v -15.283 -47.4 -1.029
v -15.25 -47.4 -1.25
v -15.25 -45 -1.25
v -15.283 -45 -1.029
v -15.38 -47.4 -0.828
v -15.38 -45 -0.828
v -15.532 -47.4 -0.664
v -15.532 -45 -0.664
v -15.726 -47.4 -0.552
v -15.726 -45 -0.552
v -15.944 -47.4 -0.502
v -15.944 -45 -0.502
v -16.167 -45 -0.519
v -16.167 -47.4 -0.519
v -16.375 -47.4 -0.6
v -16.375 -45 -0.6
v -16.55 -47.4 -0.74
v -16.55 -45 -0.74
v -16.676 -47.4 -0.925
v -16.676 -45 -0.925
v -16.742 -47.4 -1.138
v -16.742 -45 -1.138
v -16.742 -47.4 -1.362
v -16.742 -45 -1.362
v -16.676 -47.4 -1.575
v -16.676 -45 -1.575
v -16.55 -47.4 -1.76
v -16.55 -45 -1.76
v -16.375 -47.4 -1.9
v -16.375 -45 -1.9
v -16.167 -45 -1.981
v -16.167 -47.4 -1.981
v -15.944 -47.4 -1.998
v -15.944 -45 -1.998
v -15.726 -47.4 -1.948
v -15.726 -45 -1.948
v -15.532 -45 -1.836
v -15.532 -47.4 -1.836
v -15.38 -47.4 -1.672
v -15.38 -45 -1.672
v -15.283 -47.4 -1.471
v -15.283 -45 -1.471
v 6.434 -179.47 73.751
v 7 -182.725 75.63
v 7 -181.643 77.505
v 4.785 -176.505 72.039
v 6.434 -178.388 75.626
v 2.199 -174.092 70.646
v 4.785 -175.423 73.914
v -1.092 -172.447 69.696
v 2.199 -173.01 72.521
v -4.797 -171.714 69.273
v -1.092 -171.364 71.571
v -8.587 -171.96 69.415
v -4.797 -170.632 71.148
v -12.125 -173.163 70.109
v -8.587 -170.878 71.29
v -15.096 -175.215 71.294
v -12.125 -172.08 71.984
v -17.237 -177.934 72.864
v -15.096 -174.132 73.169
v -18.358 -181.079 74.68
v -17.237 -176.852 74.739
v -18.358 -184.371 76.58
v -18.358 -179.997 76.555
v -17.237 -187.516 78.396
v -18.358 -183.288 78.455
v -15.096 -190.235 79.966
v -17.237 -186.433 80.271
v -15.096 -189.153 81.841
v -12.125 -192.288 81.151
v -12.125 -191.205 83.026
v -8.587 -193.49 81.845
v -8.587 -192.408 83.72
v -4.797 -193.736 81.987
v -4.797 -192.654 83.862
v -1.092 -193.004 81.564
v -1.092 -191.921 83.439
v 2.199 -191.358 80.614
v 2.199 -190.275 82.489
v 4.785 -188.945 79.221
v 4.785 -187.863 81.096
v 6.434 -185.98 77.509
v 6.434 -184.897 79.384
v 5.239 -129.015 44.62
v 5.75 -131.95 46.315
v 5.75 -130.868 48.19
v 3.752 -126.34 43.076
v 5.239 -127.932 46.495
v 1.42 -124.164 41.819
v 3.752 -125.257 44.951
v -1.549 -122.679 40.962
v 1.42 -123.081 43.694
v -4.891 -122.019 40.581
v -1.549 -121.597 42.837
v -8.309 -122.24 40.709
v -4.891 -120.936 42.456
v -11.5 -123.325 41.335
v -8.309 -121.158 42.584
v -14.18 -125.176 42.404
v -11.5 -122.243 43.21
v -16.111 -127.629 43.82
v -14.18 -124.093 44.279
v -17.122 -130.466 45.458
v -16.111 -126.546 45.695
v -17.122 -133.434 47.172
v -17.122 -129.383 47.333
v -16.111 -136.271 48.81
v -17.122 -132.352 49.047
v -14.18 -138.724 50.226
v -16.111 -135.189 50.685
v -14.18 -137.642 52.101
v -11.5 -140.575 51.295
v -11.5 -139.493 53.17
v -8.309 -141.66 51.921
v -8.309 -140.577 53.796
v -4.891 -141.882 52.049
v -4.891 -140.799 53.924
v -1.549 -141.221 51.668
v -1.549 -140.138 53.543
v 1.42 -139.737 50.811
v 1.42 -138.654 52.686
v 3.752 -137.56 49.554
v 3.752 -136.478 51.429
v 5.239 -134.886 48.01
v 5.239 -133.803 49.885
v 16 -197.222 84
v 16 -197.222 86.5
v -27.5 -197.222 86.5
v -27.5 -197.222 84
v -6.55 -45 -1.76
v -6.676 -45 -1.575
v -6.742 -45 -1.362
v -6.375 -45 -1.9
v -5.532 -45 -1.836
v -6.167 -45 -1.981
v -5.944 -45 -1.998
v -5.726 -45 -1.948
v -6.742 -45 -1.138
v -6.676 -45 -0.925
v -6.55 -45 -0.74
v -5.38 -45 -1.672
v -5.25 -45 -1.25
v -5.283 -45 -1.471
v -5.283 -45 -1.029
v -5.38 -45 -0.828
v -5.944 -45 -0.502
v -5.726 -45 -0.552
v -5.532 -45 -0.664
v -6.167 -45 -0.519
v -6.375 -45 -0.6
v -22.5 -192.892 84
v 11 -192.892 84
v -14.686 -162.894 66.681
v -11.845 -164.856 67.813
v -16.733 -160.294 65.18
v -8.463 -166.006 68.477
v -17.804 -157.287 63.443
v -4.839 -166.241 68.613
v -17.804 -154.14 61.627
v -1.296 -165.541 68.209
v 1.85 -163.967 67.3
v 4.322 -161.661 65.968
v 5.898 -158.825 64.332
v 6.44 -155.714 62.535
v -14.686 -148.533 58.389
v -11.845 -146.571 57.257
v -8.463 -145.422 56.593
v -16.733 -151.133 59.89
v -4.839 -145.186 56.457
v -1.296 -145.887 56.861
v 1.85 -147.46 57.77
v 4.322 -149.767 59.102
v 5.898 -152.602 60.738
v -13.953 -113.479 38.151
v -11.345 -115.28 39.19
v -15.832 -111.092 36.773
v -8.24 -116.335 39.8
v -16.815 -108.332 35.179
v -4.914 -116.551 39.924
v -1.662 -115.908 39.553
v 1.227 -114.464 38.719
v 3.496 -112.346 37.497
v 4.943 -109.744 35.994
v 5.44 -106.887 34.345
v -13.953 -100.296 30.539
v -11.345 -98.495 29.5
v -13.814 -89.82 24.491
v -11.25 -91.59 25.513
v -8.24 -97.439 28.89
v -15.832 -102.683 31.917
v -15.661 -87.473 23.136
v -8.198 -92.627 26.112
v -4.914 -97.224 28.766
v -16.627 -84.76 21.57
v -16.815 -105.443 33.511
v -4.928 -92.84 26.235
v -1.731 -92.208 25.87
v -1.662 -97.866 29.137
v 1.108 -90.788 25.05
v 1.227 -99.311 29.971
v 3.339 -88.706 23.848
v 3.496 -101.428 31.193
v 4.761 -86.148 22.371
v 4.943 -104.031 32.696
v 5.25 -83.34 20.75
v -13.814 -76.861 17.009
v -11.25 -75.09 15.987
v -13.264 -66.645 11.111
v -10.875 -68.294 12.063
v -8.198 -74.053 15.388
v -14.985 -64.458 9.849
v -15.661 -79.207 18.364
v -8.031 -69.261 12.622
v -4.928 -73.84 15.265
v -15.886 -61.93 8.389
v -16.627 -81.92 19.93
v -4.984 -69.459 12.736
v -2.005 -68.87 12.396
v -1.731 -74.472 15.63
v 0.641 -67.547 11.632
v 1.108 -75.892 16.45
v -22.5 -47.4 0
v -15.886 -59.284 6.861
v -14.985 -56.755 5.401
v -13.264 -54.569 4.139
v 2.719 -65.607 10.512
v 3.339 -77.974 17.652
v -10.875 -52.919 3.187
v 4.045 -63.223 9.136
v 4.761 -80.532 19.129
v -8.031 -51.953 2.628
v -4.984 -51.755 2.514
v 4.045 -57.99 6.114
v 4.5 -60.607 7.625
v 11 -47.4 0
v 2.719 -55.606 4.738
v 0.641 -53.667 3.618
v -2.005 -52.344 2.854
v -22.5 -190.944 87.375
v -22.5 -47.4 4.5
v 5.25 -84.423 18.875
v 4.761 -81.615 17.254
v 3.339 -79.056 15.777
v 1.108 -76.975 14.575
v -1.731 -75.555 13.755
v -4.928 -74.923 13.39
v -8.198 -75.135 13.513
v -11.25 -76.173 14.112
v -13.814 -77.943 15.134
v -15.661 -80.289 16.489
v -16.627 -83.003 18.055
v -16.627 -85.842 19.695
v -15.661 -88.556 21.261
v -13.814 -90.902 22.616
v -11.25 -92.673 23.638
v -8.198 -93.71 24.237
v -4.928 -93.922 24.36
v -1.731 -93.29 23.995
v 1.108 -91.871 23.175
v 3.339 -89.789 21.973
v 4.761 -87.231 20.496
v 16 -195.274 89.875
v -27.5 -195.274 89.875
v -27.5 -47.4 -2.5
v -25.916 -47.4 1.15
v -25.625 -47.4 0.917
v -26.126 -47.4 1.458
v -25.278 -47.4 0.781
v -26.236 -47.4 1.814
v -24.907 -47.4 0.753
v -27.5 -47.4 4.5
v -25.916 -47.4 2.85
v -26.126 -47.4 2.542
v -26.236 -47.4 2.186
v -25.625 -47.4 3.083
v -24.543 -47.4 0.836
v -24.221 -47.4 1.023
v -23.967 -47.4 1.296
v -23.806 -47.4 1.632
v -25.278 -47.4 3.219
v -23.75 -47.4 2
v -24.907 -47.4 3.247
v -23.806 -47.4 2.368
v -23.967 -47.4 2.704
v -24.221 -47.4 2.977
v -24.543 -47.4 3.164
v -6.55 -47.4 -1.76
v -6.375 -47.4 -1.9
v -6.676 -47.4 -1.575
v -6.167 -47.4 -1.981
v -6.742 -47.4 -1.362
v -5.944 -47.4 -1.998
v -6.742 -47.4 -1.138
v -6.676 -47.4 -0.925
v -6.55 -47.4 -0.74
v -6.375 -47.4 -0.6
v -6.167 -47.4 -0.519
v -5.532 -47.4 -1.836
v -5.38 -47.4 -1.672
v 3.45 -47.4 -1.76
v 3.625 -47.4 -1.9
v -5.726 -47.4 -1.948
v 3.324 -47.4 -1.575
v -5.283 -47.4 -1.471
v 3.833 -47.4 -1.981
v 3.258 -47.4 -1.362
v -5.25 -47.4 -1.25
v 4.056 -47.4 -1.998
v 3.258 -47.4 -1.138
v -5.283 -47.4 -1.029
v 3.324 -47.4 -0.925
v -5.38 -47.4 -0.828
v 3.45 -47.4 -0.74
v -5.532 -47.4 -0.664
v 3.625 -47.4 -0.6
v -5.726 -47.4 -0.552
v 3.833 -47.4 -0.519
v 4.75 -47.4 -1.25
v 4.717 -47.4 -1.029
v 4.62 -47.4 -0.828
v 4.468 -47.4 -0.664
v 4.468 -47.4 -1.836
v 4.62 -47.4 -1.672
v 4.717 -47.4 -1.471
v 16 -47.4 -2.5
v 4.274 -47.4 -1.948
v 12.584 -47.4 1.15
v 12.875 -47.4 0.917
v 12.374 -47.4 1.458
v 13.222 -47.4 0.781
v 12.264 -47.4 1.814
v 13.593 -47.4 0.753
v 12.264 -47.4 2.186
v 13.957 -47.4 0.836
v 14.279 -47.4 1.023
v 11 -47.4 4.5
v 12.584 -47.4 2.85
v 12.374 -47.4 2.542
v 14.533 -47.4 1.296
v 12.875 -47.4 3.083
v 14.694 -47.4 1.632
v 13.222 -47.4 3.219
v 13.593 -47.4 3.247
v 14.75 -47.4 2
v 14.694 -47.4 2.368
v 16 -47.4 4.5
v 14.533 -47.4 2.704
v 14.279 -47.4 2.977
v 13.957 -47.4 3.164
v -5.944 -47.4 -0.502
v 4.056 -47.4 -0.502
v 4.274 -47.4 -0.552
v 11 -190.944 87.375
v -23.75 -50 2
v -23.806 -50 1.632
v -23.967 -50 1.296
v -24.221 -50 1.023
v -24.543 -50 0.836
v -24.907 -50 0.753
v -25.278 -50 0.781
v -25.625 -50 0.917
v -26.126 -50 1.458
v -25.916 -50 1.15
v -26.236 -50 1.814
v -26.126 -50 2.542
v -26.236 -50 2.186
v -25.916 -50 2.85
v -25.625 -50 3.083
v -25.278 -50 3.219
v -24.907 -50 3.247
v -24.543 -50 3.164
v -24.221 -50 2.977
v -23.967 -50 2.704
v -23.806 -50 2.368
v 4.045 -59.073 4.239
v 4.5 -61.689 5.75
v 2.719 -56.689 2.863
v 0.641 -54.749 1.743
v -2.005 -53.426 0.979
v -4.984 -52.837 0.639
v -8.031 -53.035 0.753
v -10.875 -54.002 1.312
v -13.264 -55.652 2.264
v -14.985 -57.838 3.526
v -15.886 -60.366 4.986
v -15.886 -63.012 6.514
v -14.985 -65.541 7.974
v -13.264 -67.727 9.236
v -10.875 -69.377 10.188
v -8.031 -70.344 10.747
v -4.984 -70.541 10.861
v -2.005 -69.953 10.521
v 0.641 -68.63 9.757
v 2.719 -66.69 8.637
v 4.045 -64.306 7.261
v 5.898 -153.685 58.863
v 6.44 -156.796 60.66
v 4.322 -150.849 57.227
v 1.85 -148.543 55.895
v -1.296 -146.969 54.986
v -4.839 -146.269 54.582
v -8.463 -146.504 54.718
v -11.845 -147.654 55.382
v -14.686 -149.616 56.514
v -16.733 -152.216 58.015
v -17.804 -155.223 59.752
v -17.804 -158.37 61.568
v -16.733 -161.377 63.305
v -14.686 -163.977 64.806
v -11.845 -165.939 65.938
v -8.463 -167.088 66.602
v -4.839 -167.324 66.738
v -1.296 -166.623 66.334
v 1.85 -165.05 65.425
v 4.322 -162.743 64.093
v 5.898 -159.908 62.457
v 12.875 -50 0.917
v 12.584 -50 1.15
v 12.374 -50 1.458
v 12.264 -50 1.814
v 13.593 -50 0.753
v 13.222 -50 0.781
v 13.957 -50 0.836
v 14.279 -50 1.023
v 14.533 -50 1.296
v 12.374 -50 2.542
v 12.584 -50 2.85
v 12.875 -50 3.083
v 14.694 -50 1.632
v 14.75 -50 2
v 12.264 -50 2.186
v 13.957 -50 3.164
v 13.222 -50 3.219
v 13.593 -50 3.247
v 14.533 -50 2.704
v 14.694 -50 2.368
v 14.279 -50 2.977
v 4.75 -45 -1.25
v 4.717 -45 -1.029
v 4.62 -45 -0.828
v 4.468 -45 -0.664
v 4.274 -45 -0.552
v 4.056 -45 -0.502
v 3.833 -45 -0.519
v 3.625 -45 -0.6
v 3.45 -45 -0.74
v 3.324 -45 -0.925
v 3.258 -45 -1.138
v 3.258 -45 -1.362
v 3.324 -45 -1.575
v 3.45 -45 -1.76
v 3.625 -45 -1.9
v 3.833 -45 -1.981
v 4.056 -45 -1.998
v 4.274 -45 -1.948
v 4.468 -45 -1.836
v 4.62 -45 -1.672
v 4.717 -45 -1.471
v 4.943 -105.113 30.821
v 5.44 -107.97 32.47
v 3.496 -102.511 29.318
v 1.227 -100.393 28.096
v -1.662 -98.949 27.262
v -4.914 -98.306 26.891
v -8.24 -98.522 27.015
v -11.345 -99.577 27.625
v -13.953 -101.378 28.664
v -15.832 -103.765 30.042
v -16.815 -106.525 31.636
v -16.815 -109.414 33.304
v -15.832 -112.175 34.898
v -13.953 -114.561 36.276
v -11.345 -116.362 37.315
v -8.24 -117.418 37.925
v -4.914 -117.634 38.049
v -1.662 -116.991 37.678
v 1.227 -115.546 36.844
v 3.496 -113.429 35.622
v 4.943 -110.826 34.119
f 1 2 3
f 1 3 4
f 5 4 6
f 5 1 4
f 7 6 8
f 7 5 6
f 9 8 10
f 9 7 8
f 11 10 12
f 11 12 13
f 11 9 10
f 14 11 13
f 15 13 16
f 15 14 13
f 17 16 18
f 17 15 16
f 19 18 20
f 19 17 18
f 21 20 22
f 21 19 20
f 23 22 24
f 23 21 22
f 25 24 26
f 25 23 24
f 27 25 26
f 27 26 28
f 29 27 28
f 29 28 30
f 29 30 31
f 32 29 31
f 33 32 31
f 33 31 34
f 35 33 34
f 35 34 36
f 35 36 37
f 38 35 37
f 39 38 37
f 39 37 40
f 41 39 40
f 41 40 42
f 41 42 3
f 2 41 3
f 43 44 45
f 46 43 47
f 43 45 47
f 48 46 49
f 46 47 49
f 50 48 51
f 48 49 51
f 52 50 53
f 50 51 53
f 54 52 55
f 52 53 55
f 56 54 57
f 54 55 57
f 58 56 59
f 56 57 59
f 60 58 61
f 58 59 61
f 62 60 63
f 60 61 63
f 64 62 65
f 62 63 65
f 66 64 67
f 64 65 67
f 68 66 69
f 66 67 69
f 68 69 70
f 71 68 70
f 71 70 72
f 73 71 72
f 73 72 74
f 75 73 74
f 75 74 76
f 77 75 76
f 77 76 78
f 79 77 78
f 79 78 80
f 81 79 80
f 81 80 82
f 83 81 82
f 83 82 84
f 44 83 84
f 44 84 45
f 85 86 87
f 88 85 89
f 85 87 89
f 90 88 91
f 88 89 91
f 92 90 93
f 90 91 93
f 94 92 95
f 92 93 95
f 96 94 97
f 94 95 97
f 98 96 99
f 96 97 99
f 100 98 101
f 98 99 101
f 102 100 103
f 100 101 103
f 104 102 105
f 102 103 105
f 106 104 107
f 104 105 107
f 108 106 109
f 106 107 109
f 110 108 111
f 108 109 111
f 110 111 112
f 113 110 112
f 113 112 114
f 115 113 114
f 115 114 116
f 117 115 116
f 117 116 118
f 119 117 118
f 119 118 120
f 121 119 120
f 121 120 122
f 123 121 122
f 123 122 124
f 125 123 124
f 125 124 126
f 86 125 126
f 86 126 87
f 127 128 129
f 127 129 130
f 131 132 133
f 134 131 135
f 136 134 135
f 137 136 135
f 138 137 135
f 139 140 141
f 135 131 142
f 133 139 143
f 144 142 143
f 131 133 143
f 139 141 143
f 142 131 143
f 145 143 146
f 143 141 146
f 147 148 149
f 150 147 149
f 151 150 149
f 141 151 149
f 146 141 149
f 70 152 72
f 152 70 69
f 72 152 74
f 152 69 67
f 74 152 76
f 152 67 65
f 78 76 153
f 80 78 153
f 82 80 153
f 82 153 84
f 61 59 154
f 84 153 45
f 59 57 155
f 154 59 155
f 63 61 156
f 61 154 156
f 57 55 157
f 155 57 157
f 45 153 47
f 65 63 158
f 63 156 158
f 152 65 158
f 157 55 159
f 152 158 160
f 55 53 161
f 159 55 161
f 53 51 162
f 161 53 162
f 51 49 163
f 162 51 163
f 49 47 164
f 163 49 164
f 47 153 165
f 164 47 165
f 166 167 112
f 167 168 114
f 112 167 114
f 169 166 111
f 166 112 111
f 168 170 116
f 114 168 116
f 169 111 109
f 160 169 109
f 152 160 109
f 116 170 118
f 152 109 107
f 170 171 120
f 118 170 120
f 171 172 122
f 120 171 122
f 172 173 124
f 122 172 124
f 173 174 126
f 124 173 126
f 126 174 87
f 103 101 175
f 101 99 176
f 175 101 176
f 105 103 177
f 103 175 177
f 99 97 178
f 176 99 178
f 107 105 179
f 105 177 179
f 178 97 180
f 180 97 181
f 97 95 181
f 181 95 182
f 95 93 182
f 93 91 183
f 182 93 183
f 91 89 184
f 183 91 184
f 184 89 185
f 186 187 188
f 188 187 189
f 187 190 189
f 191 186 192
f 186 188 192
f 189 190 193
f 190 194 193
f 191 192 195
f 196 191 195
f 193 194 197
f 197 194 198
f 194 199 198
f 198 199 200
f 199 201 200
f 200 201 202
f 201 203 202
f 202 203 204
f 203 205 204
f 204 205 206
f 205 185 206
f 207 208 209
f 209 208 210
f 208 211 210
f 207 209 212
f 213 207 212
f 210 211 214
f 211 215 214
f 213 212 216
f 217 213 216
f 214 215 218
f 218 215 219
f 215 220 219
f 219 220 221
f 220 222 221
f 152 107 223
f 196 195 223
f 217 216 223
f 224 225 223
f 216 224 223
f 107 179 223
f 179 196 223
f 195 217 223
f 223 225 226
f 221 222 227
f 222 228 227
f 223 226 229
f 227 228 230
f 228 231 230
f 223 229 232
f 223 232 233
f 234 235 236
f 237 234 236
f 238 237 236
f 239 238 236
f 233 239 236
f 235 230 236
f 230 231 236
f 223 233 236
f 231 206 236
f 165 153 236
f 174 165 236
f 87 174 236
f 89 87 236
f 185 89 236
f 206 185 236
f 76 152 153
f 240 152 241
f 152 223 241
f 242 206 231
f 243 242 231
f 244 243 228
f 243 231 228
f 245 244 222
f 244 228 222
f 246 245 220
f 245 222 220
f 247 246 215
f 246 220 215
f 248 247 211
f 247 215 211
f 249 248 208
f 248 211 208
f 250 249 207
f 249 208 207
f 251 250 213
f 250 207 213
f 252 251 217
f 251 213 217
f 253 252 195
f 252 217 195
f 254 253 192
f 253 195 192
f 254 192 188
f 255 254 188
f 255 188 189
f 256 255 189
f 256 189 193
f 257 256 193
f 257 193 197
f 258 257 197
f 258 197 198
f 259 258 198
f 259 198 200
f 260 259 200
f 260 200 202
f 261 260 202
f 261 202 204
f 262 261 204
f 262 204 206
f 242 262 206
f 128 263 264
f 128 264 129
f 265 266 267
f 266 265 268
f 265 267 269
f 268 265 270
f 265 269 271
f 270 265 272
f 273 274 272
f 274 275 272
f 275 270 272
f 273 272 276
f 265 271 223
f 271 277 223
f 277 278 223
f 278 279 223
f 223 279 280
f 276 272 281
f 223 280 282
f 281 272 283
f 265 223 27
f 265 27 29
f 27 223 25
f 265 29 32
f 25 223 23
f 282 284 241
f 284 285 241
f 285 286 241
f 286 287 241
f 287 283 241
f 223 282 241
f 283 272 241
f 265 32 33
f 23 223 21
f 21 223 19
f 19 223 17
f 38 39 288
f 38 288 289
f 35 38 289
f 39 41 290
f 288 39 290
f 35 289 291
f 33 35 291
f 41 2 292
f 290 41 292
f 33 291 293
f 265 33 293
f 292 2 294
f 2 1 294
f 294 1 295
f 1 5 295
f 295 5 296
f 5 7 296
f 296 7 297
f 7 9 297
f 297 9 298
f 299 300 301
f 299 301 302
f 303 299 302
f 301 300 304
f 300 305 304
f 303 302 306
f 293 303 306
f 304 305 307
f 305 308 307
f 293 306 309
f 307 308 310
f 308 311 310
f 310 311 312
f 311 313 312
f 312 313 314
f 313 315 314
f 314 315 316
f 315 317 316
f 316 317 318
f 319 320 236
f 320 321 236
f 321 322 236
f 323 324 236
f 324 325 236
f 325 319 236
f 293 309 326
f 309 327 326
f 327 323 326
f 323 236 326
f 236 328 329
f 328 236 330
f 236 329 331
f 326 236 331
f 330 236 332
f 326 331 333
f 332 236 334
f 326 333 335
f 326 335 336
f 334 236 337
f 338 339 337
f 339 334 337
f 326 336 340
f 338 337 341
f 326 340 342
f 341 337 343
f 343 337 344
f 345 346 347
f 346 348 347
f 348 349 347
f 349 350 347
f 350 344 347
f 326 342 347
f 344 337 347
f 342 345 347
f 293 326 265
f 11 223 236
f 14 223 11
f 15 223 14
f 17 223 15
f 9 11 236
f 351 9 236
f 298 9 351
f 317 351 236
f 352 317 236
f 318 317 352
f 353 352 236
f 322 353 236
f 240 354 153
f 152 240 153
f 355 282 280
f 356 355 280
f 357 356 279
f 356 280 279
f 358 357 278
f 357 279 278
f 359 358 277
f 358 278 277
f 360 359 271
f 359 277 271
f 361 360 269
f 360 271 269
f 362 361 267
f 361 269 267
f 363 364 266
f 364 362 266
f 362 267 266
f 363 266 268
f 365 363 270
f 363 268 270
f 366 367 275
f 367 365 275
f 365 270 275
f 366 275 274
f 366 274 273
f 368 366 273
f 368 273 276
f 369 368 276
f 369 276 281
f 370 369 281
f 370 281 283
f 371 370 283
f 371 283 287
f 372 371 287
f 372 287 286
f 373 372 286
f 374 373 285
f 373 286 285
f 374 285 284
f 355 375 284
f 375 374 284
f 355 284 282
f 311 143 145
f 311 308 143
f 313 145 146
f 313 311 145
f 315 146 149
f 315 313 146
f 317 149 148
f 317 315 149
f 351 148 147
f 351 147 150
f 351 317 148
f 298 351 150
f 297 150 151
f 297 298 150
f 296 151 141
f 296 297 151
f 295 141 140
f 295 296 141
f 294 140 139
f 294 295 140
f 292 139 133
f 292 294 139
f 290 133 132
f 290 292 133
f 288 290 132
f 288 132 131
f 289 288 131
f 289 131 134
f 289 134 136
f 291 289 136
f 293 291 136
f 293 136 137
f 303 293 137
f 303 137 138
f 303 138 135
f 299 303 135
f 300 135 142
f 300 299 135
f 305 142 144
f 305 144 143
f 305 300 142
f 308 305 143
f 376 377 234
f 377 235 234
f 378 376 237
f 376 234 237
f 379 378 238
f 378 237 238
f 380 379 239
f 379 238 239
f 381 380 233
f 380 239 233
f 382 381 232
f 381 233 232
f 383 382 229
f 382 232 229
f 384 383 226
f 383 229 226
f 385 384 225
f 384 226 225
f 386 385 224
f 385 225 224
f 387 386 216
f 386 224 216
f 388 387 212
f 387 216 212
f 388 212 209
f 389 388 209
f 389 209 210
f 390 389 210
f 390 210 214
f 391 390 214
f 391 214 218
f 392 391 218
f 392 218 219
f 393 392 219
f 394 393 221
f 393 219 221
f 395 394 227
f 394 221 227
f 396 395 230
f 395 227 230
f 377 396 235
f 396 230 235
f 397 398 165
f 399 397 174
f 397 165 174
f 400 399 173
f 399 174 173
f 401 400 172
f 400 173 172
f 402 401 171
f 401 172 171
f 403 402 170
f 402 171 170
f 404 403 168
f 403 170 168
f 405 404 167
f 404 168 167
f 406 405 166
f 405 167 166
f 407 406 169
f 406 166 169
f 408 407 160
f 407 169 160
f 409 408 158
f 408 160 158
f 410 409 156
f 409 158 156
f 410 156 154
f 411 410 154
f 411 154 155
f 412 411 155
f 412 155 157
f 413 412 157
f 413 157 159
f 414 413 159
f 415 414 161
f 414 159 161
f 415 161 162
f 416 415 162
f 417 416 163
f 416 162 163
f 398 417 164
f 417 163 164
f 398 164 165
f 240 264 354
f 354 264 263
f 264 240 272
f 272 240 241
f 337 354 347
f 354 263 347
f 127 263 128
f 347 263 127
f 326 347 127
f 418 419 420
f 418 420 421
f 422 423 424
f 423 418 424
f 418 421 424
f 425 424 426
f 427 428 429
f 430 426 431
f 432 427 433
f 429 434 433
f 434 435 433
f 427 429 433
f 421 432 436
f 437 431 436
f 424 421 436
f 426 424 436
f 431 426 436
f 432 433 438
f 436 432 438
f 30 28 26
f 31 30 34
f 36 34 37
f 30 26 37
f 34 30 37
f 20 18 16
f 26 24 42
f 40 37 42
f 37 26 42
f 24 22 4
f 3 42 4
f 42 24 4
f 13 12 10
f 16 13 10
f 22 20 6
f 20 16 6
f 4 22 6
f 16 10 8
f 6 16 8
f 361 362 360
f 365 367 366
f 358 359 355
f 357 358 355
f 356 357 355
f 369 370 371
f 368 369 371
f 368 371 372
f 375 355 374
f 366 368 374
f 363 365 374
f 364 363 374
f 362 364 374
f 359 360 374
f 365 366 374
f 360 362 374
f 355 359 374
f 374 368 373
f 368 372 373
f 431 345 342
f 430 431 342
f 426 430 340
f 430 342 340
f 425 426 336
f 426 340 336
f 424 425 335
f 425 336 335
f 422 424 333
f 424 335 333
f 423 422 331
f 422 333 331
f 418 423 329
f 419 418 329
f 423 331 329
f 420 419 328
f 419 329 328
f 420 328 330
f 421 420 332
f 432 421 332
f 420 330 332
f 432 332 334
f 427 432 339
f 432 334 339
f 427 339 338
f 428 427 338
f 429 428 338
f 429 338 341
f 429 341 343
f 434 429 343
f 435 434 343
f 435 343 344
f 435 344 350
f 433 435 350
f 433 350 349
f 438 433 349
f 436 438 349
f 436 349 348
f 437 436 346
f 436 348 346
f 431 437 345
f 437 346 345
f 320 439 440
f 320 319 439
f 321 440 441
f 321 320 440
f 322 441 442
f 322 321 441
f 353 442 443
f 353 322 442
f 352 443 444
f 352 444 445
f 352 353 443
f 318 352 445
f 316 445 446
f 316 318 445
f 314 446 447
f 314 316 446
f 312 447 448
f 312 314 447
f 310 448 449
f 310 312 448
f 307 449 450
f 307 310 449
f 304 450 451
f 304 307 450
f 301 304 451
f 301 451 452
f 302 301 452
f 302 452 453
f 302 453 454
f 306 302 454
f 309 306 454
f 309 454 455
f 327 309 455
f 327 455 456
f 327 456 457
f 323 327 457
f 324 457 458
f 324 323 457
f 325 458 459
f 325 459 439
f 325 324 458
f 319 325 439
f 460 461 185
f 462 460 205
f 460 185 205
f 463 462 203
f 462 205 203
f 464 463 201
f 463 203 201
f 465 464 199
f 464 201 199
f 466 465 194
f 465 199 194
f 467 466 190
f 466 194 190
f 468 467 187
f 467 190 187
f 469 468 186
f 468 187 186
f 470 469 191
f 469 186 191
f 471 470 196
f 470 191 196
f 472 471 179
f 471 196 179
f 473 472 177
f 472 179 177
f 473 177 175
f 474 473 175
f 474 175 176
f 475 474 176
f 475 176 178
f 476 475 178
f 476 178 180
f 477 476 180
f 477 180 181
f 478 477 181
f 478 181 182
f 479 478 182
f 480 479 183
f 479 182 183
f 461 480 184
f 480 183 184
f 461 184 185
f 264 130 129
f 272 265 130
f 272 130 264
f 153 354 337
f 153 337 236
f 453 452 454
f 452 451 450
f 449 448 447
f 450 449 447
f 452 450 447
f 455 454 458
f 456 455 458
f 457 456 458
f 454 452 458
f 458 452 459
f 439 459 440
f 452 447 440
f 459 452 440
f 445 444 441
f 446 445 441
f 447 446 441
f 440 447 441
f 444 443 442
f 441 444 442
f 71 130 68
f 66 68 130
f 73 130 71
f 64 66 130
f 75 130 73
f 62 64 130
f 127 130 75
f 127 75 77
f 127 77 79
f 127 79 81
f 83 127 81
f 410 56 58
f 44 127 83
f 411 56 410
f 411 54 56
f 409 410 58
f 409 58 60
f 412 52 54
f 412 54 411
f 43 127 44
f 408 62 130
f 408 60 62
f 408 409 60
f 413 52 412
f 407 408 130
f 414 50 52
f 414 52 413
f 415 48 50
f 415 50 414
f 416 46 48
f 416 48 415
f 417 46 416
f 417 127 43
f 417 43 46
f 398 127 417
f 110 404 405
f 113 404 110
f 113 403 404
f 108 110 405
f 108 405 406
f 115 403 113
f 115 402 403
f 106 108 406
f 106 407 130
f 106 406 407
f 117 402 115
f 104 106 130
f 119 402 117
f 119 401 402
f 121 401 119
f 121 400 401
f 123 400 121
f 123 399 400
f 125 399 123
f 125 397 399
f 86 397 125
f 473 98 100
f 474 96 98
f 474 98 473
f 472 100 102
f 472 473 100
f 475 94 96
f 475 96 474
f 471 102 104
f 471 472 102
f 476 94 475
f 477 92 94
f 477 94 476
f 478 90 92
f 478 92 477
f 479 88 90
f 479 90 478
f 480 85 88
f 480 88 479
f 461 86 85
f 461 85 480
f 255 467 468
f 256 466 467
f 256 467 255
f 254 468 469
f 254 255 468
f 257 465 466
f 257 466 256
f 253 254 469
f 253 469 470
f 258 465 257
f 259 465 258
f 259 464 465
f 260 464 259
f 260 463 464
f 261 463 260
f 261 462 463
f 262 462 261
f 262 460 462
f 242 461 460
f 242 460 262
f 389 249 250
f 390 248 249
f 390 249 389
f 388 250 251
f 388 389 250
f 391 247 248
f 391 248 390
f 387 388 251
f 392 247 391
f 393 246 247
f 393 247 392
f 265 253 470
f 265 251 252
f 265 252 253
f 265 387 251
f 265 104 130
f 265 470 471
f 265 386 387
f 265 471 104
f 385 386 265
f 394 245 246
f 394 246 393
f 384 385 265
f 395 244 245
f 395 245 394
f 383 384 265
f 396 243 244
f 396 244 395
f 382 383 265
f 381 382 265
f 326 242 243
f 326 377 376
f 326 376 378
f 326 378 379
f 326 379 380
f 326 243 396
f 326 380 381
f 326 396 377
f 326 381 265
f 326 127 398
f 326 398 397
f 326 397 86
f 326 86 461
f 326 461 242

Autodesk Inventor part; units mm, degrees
sketch "Boceto1" plane through (0, 0, 0) normal (0, 0, 1) x (1, 0, 0)
  line L0 (81, 20) -> (81, 63.5)
  line L1 (-27.5, 63.5) -> (-27.5, -5)
  line L2 (-27.5, -5) -> (16, -5)
  line L3 (16, -5) -> (16, 20)
  line L4 (11, 25) -> (11, -5)
  line L5 (-22.5, 58.5) -> (-22.5, -5)
  line L6 (11, 25) -> (81, 25)
  line L7 (-27.5, 63.5) -> (81, 63.5)
  line L8 (-22.5, 58.5) -> (81, 58.5)
  line L9 (16, 20) -> (81, 20)
  point P0 (0, 0)
  dimension "d7" = 5
  dimension "d68" = 5
  dimension "d69" = 33.5
  dimension "d74" = 5
  dimension "d75" = 33.5
  dimension "d76" = 5
  dimension "d77" = 70
  dimension "d111" = 30
extrude "Extrusión1" add sketch "Boceto1" against normal blind 2.5
extrude "Extrusión2" add sketch "Boceto1" along normal blind 1 contours L9 L3 L2 L4 L6 L0 | L8 L5 L2 L1 L7 L0
ref_plane "Plano de trabajo3" through (29.25, 58.5, 1) normal (0, 0, 1) x (1, 0, 0)
mirror "Simetría3" about plane through (29.25, 58.5, 1) normal (0, 0, 1) of "Extrusión2", "Extrusión1"
sketch "Boceto6" plane through (-27.5, 63.5, 4.5) normal (0, 0, 1) x (1, 0, 0)
  line L0 (108.5, -43.5) -> (43.5, -43.5) projected
  line L1 (0, -68.5) -> (0, 0) projected
  line L2 (0, -43.5) -> (0, -51.5)
  line L3 (43.5, -43.5) -> (43.5, -68.5) projected
  line L4 (0, -43.5) -> (38.5, -43.5)
  line L5 (38.5, -68.5) -> (38.5, -38.5) projected
  line L6 (0, -51.5) -> (38.5, -51.5)
  line L7 (38.5, -43.5) -> (38.5, -51.5)
  point P0 (27.5, -63.5)
  point P1 (43.5, -51.5)
  dimension "d78" = 8
extrude "Extrusión11" cut sketch "Boceto6" against normal blind 4.5
sketch "Boceto7" plane through (-27.5, -5, -2.5) normal (-1, 0, 0) x (0, 0, 1)
  line L0 (0, 0) -> (0, 68.5) projected
  line L1 (0, 0) -> (0, -42.4)
  line L2 (0, 0) -> (7, 0) projected
  line L3 (0, 0) -> (7, 0)
  line L4 (7, 0) -> (7, -42.4)
  line L5 (0, -42.4) -> (86.5, -192.2224)
  line L6 (86.5, -192.2224) -> (89, -192.2224)
  line L7 (89, -192.2224) -> (92.375, -190.2738)
  line L8 (2.5, 0) -> (2.5, -42.4)
  line L9 (0, 0) -> (7, 0) projected
  line L10 (0, 0) -> (2.5, 0)
  line L11 (86.5, -192.2224) -> (89, -192.2224)
  line L12 (89, -192.2224) -> (92.375, -190.2738)
  line L13 (2.5, -42.4) -> (89, -192.2224)
  line L14 (0, -42.4) -> (-1.0904, -42.4)
  line L15 (7, -42.4) -> (92.375, -190.2738)
  line L16 (86.5, -187.8923) -> (89.875, -185.9437)
  point P0 (2.5, 5)
  point P1 (4.5, 0)
  point P2 (-0.5452, -42.4)
  dimension "d81" = 42.4
  dimension "d82" = 173
  dimension "d88" = 120
  dimension "d108" = 5
ref_plane "Plano de trabajo4" through (-5.75, -5, -2.5) normal (1, 0, 0) x (0, 0, -1)
extrude "Extrusión12" add sketch "Boceto7" against normal blind 21.75 contours L2 L8 L13 L6 L5 L1
extrude "Extrusión13" add sketch "Boceto7" against normal blind 5 contours L2 L4 L15 L16 L13 L8
extrude "Extrusión14" add sketch "Boceto7" against normal blind 21.75 contours L13 L16 L15 L7
mirror "Simetría4" about plane through (-5.75, -5, -2.5) normal (1, 0, 0) of "Extrusión12", "Extrusión13", "Extrusión14"
sketch "Boceto8" plane through (-22.5, -47.4, 0) normal (0, 0.5, 0.866) x (1, 0, 0)
  line L0 (0, 0) -> (33.5, 0) projected
  line L1 (16.75, 0) -> (16.75, -5)
  circle A0 centre (16.75, -15.25) radius 10.25
  line L2 (16.75, -25.5) -> (16.75, -30.5)
  circle A1 centre (16.75, -41.5) radius 11
  line L3 (16.75, -52.5) -> (16.75, -57.5)
  circle A2 centre (16.75, -68.69) radius 11.19
  line L4 (16.75, -79.88) -> (16.75, -84.88)
  circle A3 centre (16.75, -96.38) radius 11.5
  line L5 (16.75, -107.88) -> (16.75, -112.88)
  circle A4 centre (16.75, -125.07) radius 12.19
  line L6 (16.75, -137.26) -> (16.75, -142.26)
  circle A5 centre (16.75, -155.01) radius 12.75
  point P0 (22.5, 41.0496)
  dimension "d105" = 25.5
  dimension "d94" = 5
  dimension "d95" = 20.5
  dimension "d96" = 5
  dimension "d97" = 5
  dimension "d98" = 5
  dimension "d99" = 5
  dimension "d100" = 5
  dimension "d101" = 22
  dimension "d102" = 22.38
  dimension "d103" = 23
  dimension "d104" = 24.38
extrude "Extrusión15" cut sketch "Boceto8" against normal blind 21.75
sketch "Boceto9" plane through (-27.5, 63.5, -2.5) normal (-1, 0, 0) x (0, 0, 1)
  line L0 (2.5, -51.5) -> (2.5, -110.9) projected
  line L1 (0, 0) -> (0, -110.9) projected
  line L2 (0, -110.9) -> (2.5, -110.9)
  line L3 (2.5, -110.9) -> (2.5, -70.9)
  line L4 (2.5, -70.9) -> (0, -70.9)
  line L5 (0, -70.9) -> (0, -110.9)
  line L6 (0, -43.5) -> (0, -110.9) projected
  line L7 (0, -102.4) -> (2.5, -102.4)
  point P0 (2.5, -63.5)
  point P1 (7, -110.9)
  dimension "d109" = 2.5
  dimension "d110" = 40
  dimension "d112" = 31.5
extrude "Extrusión16" cut sketch "Boceto9" against normal through all contours L0 L7 L1 L4
ref_plane "Plano de trabajo5" through (-27.5, -47.4, 0) normal (0, -1, 0) x (1, 0, 0)
ref_plane "Plano de trabajo6" through (-27.5, -47.4, 0) normal (0, -1, 0) x (1, 0, 0)
sketch "Boceto11" plane through (-27.5, -47.4, 0) normal (0, -1, 0) x (1, 0, 0)
  line L0 (43.5, 4.5) -> (38.5, 4.5) projected
  line L1 (38.5, 0) -> (38.5, 4.5) projected
  line L2 (5, 0) -> (38.5, 0) projected
  line L3 (5, 4.5) -> (5, 0) projected
  line L4 (0, 4.5) -> (5, 4.5) projected
  line L5 (0, -2.5) -> (0, 4.5) projected
  line L6 (0, -2.5) -> (43.5, -2.5) projected
  line L7 (43.5, 4.5) -> (43.5, -2.5) projected
  line L8 (0, 0) -> (0, -2.5) projected
  line L9 (43.5, -2.5) -> (43.5, 4.5) projected
  circle A0 centre (2.5, 2) radius 1.25
  line L10 (108.5, 2) -> (5, 2) projected
  circle A1 centre (41, 2) radius 1.25
  circle A2 centre (11.5, -1.25) radius 0.75
  circle A3 centre (21.5, -1.25) radius 0.75
  circle A4 centre (31.5, -1.25) radius 0.75
  point P0 (27.5, 0)
  dimension "d117" = 2.5
  dimension "d118" = 2.5
  dimension "d119" = 38.5
  dimension "d120" = 1.5
  dimension "d121" = 1.5
  dimension "d122" = 1.5
  dimension "d123" = 10
  dimension "d124" = 10
extrude "Extrusión18" add sketch "Boceto11" along normal blind 2.5 contours A1 L10 | L10 A1 | A0
extrude "Extrusión19" cut sketch "Boceto11" against normal blind 2.5 contours A2 | A3 | A4
sketch "Boceto12" plane through (-27.5, -47.4, 0) normal (0, -1, 0) x (1, 0, 0)
  line L0 (0, -2.5) -> (0, 84) projected
  line L1 (0, 4.5) -> (108.5, 4.5) projected
  line L2 (0, -2.5) -> (108.5, -2.5)
  line L3 (108.5, -2.5) -> (108.5, 4.5)
  line L4 (108.5, 4.5) -> (0, 4.5)
  line L5 (0, 4.5) -> (0, -2.5)
  point P0 (27.5, 0)
extrude "Extrusión20" cut sketch "Boceto12" against normal through all
extrude "Extrusión21" add sketch "Boceto11" against normal blind 2.4 contours A2 | A3 | A4
extrude "Extrusión22" cut sketch "Boceto11" along normal blind 2.6 contours A1 L10 | L10 A1 | A0
equation "\"d105\" = UnSol"
equation "\"d94\" = razon"
equation "\"d95\" = diezcen"
equation "\"d96\" = razon"
equation "\"d97\" = razon"
equation "\"d98\" = razon"
equation "\"d99\" = razon"
equation "\"d100\" = razon"
equation "\"d101\" = cincuentacen"
equation "\"d102\" = dossol"
equation "\"d103\" = veintecen"
equation "\"d104\" = cincosol"
equation "\"UnSol\" = 25.5"
equation "\"diezcen\" = 20.5"
equation "\"veintecen\" = 23"
equation "\"cincuentacen\" = 22"
equation "\"dossol\" = 22.38"
equation "\"cincosol\" = 24.38"
equation "\"razon\" = 5"
properties part number "V2"
